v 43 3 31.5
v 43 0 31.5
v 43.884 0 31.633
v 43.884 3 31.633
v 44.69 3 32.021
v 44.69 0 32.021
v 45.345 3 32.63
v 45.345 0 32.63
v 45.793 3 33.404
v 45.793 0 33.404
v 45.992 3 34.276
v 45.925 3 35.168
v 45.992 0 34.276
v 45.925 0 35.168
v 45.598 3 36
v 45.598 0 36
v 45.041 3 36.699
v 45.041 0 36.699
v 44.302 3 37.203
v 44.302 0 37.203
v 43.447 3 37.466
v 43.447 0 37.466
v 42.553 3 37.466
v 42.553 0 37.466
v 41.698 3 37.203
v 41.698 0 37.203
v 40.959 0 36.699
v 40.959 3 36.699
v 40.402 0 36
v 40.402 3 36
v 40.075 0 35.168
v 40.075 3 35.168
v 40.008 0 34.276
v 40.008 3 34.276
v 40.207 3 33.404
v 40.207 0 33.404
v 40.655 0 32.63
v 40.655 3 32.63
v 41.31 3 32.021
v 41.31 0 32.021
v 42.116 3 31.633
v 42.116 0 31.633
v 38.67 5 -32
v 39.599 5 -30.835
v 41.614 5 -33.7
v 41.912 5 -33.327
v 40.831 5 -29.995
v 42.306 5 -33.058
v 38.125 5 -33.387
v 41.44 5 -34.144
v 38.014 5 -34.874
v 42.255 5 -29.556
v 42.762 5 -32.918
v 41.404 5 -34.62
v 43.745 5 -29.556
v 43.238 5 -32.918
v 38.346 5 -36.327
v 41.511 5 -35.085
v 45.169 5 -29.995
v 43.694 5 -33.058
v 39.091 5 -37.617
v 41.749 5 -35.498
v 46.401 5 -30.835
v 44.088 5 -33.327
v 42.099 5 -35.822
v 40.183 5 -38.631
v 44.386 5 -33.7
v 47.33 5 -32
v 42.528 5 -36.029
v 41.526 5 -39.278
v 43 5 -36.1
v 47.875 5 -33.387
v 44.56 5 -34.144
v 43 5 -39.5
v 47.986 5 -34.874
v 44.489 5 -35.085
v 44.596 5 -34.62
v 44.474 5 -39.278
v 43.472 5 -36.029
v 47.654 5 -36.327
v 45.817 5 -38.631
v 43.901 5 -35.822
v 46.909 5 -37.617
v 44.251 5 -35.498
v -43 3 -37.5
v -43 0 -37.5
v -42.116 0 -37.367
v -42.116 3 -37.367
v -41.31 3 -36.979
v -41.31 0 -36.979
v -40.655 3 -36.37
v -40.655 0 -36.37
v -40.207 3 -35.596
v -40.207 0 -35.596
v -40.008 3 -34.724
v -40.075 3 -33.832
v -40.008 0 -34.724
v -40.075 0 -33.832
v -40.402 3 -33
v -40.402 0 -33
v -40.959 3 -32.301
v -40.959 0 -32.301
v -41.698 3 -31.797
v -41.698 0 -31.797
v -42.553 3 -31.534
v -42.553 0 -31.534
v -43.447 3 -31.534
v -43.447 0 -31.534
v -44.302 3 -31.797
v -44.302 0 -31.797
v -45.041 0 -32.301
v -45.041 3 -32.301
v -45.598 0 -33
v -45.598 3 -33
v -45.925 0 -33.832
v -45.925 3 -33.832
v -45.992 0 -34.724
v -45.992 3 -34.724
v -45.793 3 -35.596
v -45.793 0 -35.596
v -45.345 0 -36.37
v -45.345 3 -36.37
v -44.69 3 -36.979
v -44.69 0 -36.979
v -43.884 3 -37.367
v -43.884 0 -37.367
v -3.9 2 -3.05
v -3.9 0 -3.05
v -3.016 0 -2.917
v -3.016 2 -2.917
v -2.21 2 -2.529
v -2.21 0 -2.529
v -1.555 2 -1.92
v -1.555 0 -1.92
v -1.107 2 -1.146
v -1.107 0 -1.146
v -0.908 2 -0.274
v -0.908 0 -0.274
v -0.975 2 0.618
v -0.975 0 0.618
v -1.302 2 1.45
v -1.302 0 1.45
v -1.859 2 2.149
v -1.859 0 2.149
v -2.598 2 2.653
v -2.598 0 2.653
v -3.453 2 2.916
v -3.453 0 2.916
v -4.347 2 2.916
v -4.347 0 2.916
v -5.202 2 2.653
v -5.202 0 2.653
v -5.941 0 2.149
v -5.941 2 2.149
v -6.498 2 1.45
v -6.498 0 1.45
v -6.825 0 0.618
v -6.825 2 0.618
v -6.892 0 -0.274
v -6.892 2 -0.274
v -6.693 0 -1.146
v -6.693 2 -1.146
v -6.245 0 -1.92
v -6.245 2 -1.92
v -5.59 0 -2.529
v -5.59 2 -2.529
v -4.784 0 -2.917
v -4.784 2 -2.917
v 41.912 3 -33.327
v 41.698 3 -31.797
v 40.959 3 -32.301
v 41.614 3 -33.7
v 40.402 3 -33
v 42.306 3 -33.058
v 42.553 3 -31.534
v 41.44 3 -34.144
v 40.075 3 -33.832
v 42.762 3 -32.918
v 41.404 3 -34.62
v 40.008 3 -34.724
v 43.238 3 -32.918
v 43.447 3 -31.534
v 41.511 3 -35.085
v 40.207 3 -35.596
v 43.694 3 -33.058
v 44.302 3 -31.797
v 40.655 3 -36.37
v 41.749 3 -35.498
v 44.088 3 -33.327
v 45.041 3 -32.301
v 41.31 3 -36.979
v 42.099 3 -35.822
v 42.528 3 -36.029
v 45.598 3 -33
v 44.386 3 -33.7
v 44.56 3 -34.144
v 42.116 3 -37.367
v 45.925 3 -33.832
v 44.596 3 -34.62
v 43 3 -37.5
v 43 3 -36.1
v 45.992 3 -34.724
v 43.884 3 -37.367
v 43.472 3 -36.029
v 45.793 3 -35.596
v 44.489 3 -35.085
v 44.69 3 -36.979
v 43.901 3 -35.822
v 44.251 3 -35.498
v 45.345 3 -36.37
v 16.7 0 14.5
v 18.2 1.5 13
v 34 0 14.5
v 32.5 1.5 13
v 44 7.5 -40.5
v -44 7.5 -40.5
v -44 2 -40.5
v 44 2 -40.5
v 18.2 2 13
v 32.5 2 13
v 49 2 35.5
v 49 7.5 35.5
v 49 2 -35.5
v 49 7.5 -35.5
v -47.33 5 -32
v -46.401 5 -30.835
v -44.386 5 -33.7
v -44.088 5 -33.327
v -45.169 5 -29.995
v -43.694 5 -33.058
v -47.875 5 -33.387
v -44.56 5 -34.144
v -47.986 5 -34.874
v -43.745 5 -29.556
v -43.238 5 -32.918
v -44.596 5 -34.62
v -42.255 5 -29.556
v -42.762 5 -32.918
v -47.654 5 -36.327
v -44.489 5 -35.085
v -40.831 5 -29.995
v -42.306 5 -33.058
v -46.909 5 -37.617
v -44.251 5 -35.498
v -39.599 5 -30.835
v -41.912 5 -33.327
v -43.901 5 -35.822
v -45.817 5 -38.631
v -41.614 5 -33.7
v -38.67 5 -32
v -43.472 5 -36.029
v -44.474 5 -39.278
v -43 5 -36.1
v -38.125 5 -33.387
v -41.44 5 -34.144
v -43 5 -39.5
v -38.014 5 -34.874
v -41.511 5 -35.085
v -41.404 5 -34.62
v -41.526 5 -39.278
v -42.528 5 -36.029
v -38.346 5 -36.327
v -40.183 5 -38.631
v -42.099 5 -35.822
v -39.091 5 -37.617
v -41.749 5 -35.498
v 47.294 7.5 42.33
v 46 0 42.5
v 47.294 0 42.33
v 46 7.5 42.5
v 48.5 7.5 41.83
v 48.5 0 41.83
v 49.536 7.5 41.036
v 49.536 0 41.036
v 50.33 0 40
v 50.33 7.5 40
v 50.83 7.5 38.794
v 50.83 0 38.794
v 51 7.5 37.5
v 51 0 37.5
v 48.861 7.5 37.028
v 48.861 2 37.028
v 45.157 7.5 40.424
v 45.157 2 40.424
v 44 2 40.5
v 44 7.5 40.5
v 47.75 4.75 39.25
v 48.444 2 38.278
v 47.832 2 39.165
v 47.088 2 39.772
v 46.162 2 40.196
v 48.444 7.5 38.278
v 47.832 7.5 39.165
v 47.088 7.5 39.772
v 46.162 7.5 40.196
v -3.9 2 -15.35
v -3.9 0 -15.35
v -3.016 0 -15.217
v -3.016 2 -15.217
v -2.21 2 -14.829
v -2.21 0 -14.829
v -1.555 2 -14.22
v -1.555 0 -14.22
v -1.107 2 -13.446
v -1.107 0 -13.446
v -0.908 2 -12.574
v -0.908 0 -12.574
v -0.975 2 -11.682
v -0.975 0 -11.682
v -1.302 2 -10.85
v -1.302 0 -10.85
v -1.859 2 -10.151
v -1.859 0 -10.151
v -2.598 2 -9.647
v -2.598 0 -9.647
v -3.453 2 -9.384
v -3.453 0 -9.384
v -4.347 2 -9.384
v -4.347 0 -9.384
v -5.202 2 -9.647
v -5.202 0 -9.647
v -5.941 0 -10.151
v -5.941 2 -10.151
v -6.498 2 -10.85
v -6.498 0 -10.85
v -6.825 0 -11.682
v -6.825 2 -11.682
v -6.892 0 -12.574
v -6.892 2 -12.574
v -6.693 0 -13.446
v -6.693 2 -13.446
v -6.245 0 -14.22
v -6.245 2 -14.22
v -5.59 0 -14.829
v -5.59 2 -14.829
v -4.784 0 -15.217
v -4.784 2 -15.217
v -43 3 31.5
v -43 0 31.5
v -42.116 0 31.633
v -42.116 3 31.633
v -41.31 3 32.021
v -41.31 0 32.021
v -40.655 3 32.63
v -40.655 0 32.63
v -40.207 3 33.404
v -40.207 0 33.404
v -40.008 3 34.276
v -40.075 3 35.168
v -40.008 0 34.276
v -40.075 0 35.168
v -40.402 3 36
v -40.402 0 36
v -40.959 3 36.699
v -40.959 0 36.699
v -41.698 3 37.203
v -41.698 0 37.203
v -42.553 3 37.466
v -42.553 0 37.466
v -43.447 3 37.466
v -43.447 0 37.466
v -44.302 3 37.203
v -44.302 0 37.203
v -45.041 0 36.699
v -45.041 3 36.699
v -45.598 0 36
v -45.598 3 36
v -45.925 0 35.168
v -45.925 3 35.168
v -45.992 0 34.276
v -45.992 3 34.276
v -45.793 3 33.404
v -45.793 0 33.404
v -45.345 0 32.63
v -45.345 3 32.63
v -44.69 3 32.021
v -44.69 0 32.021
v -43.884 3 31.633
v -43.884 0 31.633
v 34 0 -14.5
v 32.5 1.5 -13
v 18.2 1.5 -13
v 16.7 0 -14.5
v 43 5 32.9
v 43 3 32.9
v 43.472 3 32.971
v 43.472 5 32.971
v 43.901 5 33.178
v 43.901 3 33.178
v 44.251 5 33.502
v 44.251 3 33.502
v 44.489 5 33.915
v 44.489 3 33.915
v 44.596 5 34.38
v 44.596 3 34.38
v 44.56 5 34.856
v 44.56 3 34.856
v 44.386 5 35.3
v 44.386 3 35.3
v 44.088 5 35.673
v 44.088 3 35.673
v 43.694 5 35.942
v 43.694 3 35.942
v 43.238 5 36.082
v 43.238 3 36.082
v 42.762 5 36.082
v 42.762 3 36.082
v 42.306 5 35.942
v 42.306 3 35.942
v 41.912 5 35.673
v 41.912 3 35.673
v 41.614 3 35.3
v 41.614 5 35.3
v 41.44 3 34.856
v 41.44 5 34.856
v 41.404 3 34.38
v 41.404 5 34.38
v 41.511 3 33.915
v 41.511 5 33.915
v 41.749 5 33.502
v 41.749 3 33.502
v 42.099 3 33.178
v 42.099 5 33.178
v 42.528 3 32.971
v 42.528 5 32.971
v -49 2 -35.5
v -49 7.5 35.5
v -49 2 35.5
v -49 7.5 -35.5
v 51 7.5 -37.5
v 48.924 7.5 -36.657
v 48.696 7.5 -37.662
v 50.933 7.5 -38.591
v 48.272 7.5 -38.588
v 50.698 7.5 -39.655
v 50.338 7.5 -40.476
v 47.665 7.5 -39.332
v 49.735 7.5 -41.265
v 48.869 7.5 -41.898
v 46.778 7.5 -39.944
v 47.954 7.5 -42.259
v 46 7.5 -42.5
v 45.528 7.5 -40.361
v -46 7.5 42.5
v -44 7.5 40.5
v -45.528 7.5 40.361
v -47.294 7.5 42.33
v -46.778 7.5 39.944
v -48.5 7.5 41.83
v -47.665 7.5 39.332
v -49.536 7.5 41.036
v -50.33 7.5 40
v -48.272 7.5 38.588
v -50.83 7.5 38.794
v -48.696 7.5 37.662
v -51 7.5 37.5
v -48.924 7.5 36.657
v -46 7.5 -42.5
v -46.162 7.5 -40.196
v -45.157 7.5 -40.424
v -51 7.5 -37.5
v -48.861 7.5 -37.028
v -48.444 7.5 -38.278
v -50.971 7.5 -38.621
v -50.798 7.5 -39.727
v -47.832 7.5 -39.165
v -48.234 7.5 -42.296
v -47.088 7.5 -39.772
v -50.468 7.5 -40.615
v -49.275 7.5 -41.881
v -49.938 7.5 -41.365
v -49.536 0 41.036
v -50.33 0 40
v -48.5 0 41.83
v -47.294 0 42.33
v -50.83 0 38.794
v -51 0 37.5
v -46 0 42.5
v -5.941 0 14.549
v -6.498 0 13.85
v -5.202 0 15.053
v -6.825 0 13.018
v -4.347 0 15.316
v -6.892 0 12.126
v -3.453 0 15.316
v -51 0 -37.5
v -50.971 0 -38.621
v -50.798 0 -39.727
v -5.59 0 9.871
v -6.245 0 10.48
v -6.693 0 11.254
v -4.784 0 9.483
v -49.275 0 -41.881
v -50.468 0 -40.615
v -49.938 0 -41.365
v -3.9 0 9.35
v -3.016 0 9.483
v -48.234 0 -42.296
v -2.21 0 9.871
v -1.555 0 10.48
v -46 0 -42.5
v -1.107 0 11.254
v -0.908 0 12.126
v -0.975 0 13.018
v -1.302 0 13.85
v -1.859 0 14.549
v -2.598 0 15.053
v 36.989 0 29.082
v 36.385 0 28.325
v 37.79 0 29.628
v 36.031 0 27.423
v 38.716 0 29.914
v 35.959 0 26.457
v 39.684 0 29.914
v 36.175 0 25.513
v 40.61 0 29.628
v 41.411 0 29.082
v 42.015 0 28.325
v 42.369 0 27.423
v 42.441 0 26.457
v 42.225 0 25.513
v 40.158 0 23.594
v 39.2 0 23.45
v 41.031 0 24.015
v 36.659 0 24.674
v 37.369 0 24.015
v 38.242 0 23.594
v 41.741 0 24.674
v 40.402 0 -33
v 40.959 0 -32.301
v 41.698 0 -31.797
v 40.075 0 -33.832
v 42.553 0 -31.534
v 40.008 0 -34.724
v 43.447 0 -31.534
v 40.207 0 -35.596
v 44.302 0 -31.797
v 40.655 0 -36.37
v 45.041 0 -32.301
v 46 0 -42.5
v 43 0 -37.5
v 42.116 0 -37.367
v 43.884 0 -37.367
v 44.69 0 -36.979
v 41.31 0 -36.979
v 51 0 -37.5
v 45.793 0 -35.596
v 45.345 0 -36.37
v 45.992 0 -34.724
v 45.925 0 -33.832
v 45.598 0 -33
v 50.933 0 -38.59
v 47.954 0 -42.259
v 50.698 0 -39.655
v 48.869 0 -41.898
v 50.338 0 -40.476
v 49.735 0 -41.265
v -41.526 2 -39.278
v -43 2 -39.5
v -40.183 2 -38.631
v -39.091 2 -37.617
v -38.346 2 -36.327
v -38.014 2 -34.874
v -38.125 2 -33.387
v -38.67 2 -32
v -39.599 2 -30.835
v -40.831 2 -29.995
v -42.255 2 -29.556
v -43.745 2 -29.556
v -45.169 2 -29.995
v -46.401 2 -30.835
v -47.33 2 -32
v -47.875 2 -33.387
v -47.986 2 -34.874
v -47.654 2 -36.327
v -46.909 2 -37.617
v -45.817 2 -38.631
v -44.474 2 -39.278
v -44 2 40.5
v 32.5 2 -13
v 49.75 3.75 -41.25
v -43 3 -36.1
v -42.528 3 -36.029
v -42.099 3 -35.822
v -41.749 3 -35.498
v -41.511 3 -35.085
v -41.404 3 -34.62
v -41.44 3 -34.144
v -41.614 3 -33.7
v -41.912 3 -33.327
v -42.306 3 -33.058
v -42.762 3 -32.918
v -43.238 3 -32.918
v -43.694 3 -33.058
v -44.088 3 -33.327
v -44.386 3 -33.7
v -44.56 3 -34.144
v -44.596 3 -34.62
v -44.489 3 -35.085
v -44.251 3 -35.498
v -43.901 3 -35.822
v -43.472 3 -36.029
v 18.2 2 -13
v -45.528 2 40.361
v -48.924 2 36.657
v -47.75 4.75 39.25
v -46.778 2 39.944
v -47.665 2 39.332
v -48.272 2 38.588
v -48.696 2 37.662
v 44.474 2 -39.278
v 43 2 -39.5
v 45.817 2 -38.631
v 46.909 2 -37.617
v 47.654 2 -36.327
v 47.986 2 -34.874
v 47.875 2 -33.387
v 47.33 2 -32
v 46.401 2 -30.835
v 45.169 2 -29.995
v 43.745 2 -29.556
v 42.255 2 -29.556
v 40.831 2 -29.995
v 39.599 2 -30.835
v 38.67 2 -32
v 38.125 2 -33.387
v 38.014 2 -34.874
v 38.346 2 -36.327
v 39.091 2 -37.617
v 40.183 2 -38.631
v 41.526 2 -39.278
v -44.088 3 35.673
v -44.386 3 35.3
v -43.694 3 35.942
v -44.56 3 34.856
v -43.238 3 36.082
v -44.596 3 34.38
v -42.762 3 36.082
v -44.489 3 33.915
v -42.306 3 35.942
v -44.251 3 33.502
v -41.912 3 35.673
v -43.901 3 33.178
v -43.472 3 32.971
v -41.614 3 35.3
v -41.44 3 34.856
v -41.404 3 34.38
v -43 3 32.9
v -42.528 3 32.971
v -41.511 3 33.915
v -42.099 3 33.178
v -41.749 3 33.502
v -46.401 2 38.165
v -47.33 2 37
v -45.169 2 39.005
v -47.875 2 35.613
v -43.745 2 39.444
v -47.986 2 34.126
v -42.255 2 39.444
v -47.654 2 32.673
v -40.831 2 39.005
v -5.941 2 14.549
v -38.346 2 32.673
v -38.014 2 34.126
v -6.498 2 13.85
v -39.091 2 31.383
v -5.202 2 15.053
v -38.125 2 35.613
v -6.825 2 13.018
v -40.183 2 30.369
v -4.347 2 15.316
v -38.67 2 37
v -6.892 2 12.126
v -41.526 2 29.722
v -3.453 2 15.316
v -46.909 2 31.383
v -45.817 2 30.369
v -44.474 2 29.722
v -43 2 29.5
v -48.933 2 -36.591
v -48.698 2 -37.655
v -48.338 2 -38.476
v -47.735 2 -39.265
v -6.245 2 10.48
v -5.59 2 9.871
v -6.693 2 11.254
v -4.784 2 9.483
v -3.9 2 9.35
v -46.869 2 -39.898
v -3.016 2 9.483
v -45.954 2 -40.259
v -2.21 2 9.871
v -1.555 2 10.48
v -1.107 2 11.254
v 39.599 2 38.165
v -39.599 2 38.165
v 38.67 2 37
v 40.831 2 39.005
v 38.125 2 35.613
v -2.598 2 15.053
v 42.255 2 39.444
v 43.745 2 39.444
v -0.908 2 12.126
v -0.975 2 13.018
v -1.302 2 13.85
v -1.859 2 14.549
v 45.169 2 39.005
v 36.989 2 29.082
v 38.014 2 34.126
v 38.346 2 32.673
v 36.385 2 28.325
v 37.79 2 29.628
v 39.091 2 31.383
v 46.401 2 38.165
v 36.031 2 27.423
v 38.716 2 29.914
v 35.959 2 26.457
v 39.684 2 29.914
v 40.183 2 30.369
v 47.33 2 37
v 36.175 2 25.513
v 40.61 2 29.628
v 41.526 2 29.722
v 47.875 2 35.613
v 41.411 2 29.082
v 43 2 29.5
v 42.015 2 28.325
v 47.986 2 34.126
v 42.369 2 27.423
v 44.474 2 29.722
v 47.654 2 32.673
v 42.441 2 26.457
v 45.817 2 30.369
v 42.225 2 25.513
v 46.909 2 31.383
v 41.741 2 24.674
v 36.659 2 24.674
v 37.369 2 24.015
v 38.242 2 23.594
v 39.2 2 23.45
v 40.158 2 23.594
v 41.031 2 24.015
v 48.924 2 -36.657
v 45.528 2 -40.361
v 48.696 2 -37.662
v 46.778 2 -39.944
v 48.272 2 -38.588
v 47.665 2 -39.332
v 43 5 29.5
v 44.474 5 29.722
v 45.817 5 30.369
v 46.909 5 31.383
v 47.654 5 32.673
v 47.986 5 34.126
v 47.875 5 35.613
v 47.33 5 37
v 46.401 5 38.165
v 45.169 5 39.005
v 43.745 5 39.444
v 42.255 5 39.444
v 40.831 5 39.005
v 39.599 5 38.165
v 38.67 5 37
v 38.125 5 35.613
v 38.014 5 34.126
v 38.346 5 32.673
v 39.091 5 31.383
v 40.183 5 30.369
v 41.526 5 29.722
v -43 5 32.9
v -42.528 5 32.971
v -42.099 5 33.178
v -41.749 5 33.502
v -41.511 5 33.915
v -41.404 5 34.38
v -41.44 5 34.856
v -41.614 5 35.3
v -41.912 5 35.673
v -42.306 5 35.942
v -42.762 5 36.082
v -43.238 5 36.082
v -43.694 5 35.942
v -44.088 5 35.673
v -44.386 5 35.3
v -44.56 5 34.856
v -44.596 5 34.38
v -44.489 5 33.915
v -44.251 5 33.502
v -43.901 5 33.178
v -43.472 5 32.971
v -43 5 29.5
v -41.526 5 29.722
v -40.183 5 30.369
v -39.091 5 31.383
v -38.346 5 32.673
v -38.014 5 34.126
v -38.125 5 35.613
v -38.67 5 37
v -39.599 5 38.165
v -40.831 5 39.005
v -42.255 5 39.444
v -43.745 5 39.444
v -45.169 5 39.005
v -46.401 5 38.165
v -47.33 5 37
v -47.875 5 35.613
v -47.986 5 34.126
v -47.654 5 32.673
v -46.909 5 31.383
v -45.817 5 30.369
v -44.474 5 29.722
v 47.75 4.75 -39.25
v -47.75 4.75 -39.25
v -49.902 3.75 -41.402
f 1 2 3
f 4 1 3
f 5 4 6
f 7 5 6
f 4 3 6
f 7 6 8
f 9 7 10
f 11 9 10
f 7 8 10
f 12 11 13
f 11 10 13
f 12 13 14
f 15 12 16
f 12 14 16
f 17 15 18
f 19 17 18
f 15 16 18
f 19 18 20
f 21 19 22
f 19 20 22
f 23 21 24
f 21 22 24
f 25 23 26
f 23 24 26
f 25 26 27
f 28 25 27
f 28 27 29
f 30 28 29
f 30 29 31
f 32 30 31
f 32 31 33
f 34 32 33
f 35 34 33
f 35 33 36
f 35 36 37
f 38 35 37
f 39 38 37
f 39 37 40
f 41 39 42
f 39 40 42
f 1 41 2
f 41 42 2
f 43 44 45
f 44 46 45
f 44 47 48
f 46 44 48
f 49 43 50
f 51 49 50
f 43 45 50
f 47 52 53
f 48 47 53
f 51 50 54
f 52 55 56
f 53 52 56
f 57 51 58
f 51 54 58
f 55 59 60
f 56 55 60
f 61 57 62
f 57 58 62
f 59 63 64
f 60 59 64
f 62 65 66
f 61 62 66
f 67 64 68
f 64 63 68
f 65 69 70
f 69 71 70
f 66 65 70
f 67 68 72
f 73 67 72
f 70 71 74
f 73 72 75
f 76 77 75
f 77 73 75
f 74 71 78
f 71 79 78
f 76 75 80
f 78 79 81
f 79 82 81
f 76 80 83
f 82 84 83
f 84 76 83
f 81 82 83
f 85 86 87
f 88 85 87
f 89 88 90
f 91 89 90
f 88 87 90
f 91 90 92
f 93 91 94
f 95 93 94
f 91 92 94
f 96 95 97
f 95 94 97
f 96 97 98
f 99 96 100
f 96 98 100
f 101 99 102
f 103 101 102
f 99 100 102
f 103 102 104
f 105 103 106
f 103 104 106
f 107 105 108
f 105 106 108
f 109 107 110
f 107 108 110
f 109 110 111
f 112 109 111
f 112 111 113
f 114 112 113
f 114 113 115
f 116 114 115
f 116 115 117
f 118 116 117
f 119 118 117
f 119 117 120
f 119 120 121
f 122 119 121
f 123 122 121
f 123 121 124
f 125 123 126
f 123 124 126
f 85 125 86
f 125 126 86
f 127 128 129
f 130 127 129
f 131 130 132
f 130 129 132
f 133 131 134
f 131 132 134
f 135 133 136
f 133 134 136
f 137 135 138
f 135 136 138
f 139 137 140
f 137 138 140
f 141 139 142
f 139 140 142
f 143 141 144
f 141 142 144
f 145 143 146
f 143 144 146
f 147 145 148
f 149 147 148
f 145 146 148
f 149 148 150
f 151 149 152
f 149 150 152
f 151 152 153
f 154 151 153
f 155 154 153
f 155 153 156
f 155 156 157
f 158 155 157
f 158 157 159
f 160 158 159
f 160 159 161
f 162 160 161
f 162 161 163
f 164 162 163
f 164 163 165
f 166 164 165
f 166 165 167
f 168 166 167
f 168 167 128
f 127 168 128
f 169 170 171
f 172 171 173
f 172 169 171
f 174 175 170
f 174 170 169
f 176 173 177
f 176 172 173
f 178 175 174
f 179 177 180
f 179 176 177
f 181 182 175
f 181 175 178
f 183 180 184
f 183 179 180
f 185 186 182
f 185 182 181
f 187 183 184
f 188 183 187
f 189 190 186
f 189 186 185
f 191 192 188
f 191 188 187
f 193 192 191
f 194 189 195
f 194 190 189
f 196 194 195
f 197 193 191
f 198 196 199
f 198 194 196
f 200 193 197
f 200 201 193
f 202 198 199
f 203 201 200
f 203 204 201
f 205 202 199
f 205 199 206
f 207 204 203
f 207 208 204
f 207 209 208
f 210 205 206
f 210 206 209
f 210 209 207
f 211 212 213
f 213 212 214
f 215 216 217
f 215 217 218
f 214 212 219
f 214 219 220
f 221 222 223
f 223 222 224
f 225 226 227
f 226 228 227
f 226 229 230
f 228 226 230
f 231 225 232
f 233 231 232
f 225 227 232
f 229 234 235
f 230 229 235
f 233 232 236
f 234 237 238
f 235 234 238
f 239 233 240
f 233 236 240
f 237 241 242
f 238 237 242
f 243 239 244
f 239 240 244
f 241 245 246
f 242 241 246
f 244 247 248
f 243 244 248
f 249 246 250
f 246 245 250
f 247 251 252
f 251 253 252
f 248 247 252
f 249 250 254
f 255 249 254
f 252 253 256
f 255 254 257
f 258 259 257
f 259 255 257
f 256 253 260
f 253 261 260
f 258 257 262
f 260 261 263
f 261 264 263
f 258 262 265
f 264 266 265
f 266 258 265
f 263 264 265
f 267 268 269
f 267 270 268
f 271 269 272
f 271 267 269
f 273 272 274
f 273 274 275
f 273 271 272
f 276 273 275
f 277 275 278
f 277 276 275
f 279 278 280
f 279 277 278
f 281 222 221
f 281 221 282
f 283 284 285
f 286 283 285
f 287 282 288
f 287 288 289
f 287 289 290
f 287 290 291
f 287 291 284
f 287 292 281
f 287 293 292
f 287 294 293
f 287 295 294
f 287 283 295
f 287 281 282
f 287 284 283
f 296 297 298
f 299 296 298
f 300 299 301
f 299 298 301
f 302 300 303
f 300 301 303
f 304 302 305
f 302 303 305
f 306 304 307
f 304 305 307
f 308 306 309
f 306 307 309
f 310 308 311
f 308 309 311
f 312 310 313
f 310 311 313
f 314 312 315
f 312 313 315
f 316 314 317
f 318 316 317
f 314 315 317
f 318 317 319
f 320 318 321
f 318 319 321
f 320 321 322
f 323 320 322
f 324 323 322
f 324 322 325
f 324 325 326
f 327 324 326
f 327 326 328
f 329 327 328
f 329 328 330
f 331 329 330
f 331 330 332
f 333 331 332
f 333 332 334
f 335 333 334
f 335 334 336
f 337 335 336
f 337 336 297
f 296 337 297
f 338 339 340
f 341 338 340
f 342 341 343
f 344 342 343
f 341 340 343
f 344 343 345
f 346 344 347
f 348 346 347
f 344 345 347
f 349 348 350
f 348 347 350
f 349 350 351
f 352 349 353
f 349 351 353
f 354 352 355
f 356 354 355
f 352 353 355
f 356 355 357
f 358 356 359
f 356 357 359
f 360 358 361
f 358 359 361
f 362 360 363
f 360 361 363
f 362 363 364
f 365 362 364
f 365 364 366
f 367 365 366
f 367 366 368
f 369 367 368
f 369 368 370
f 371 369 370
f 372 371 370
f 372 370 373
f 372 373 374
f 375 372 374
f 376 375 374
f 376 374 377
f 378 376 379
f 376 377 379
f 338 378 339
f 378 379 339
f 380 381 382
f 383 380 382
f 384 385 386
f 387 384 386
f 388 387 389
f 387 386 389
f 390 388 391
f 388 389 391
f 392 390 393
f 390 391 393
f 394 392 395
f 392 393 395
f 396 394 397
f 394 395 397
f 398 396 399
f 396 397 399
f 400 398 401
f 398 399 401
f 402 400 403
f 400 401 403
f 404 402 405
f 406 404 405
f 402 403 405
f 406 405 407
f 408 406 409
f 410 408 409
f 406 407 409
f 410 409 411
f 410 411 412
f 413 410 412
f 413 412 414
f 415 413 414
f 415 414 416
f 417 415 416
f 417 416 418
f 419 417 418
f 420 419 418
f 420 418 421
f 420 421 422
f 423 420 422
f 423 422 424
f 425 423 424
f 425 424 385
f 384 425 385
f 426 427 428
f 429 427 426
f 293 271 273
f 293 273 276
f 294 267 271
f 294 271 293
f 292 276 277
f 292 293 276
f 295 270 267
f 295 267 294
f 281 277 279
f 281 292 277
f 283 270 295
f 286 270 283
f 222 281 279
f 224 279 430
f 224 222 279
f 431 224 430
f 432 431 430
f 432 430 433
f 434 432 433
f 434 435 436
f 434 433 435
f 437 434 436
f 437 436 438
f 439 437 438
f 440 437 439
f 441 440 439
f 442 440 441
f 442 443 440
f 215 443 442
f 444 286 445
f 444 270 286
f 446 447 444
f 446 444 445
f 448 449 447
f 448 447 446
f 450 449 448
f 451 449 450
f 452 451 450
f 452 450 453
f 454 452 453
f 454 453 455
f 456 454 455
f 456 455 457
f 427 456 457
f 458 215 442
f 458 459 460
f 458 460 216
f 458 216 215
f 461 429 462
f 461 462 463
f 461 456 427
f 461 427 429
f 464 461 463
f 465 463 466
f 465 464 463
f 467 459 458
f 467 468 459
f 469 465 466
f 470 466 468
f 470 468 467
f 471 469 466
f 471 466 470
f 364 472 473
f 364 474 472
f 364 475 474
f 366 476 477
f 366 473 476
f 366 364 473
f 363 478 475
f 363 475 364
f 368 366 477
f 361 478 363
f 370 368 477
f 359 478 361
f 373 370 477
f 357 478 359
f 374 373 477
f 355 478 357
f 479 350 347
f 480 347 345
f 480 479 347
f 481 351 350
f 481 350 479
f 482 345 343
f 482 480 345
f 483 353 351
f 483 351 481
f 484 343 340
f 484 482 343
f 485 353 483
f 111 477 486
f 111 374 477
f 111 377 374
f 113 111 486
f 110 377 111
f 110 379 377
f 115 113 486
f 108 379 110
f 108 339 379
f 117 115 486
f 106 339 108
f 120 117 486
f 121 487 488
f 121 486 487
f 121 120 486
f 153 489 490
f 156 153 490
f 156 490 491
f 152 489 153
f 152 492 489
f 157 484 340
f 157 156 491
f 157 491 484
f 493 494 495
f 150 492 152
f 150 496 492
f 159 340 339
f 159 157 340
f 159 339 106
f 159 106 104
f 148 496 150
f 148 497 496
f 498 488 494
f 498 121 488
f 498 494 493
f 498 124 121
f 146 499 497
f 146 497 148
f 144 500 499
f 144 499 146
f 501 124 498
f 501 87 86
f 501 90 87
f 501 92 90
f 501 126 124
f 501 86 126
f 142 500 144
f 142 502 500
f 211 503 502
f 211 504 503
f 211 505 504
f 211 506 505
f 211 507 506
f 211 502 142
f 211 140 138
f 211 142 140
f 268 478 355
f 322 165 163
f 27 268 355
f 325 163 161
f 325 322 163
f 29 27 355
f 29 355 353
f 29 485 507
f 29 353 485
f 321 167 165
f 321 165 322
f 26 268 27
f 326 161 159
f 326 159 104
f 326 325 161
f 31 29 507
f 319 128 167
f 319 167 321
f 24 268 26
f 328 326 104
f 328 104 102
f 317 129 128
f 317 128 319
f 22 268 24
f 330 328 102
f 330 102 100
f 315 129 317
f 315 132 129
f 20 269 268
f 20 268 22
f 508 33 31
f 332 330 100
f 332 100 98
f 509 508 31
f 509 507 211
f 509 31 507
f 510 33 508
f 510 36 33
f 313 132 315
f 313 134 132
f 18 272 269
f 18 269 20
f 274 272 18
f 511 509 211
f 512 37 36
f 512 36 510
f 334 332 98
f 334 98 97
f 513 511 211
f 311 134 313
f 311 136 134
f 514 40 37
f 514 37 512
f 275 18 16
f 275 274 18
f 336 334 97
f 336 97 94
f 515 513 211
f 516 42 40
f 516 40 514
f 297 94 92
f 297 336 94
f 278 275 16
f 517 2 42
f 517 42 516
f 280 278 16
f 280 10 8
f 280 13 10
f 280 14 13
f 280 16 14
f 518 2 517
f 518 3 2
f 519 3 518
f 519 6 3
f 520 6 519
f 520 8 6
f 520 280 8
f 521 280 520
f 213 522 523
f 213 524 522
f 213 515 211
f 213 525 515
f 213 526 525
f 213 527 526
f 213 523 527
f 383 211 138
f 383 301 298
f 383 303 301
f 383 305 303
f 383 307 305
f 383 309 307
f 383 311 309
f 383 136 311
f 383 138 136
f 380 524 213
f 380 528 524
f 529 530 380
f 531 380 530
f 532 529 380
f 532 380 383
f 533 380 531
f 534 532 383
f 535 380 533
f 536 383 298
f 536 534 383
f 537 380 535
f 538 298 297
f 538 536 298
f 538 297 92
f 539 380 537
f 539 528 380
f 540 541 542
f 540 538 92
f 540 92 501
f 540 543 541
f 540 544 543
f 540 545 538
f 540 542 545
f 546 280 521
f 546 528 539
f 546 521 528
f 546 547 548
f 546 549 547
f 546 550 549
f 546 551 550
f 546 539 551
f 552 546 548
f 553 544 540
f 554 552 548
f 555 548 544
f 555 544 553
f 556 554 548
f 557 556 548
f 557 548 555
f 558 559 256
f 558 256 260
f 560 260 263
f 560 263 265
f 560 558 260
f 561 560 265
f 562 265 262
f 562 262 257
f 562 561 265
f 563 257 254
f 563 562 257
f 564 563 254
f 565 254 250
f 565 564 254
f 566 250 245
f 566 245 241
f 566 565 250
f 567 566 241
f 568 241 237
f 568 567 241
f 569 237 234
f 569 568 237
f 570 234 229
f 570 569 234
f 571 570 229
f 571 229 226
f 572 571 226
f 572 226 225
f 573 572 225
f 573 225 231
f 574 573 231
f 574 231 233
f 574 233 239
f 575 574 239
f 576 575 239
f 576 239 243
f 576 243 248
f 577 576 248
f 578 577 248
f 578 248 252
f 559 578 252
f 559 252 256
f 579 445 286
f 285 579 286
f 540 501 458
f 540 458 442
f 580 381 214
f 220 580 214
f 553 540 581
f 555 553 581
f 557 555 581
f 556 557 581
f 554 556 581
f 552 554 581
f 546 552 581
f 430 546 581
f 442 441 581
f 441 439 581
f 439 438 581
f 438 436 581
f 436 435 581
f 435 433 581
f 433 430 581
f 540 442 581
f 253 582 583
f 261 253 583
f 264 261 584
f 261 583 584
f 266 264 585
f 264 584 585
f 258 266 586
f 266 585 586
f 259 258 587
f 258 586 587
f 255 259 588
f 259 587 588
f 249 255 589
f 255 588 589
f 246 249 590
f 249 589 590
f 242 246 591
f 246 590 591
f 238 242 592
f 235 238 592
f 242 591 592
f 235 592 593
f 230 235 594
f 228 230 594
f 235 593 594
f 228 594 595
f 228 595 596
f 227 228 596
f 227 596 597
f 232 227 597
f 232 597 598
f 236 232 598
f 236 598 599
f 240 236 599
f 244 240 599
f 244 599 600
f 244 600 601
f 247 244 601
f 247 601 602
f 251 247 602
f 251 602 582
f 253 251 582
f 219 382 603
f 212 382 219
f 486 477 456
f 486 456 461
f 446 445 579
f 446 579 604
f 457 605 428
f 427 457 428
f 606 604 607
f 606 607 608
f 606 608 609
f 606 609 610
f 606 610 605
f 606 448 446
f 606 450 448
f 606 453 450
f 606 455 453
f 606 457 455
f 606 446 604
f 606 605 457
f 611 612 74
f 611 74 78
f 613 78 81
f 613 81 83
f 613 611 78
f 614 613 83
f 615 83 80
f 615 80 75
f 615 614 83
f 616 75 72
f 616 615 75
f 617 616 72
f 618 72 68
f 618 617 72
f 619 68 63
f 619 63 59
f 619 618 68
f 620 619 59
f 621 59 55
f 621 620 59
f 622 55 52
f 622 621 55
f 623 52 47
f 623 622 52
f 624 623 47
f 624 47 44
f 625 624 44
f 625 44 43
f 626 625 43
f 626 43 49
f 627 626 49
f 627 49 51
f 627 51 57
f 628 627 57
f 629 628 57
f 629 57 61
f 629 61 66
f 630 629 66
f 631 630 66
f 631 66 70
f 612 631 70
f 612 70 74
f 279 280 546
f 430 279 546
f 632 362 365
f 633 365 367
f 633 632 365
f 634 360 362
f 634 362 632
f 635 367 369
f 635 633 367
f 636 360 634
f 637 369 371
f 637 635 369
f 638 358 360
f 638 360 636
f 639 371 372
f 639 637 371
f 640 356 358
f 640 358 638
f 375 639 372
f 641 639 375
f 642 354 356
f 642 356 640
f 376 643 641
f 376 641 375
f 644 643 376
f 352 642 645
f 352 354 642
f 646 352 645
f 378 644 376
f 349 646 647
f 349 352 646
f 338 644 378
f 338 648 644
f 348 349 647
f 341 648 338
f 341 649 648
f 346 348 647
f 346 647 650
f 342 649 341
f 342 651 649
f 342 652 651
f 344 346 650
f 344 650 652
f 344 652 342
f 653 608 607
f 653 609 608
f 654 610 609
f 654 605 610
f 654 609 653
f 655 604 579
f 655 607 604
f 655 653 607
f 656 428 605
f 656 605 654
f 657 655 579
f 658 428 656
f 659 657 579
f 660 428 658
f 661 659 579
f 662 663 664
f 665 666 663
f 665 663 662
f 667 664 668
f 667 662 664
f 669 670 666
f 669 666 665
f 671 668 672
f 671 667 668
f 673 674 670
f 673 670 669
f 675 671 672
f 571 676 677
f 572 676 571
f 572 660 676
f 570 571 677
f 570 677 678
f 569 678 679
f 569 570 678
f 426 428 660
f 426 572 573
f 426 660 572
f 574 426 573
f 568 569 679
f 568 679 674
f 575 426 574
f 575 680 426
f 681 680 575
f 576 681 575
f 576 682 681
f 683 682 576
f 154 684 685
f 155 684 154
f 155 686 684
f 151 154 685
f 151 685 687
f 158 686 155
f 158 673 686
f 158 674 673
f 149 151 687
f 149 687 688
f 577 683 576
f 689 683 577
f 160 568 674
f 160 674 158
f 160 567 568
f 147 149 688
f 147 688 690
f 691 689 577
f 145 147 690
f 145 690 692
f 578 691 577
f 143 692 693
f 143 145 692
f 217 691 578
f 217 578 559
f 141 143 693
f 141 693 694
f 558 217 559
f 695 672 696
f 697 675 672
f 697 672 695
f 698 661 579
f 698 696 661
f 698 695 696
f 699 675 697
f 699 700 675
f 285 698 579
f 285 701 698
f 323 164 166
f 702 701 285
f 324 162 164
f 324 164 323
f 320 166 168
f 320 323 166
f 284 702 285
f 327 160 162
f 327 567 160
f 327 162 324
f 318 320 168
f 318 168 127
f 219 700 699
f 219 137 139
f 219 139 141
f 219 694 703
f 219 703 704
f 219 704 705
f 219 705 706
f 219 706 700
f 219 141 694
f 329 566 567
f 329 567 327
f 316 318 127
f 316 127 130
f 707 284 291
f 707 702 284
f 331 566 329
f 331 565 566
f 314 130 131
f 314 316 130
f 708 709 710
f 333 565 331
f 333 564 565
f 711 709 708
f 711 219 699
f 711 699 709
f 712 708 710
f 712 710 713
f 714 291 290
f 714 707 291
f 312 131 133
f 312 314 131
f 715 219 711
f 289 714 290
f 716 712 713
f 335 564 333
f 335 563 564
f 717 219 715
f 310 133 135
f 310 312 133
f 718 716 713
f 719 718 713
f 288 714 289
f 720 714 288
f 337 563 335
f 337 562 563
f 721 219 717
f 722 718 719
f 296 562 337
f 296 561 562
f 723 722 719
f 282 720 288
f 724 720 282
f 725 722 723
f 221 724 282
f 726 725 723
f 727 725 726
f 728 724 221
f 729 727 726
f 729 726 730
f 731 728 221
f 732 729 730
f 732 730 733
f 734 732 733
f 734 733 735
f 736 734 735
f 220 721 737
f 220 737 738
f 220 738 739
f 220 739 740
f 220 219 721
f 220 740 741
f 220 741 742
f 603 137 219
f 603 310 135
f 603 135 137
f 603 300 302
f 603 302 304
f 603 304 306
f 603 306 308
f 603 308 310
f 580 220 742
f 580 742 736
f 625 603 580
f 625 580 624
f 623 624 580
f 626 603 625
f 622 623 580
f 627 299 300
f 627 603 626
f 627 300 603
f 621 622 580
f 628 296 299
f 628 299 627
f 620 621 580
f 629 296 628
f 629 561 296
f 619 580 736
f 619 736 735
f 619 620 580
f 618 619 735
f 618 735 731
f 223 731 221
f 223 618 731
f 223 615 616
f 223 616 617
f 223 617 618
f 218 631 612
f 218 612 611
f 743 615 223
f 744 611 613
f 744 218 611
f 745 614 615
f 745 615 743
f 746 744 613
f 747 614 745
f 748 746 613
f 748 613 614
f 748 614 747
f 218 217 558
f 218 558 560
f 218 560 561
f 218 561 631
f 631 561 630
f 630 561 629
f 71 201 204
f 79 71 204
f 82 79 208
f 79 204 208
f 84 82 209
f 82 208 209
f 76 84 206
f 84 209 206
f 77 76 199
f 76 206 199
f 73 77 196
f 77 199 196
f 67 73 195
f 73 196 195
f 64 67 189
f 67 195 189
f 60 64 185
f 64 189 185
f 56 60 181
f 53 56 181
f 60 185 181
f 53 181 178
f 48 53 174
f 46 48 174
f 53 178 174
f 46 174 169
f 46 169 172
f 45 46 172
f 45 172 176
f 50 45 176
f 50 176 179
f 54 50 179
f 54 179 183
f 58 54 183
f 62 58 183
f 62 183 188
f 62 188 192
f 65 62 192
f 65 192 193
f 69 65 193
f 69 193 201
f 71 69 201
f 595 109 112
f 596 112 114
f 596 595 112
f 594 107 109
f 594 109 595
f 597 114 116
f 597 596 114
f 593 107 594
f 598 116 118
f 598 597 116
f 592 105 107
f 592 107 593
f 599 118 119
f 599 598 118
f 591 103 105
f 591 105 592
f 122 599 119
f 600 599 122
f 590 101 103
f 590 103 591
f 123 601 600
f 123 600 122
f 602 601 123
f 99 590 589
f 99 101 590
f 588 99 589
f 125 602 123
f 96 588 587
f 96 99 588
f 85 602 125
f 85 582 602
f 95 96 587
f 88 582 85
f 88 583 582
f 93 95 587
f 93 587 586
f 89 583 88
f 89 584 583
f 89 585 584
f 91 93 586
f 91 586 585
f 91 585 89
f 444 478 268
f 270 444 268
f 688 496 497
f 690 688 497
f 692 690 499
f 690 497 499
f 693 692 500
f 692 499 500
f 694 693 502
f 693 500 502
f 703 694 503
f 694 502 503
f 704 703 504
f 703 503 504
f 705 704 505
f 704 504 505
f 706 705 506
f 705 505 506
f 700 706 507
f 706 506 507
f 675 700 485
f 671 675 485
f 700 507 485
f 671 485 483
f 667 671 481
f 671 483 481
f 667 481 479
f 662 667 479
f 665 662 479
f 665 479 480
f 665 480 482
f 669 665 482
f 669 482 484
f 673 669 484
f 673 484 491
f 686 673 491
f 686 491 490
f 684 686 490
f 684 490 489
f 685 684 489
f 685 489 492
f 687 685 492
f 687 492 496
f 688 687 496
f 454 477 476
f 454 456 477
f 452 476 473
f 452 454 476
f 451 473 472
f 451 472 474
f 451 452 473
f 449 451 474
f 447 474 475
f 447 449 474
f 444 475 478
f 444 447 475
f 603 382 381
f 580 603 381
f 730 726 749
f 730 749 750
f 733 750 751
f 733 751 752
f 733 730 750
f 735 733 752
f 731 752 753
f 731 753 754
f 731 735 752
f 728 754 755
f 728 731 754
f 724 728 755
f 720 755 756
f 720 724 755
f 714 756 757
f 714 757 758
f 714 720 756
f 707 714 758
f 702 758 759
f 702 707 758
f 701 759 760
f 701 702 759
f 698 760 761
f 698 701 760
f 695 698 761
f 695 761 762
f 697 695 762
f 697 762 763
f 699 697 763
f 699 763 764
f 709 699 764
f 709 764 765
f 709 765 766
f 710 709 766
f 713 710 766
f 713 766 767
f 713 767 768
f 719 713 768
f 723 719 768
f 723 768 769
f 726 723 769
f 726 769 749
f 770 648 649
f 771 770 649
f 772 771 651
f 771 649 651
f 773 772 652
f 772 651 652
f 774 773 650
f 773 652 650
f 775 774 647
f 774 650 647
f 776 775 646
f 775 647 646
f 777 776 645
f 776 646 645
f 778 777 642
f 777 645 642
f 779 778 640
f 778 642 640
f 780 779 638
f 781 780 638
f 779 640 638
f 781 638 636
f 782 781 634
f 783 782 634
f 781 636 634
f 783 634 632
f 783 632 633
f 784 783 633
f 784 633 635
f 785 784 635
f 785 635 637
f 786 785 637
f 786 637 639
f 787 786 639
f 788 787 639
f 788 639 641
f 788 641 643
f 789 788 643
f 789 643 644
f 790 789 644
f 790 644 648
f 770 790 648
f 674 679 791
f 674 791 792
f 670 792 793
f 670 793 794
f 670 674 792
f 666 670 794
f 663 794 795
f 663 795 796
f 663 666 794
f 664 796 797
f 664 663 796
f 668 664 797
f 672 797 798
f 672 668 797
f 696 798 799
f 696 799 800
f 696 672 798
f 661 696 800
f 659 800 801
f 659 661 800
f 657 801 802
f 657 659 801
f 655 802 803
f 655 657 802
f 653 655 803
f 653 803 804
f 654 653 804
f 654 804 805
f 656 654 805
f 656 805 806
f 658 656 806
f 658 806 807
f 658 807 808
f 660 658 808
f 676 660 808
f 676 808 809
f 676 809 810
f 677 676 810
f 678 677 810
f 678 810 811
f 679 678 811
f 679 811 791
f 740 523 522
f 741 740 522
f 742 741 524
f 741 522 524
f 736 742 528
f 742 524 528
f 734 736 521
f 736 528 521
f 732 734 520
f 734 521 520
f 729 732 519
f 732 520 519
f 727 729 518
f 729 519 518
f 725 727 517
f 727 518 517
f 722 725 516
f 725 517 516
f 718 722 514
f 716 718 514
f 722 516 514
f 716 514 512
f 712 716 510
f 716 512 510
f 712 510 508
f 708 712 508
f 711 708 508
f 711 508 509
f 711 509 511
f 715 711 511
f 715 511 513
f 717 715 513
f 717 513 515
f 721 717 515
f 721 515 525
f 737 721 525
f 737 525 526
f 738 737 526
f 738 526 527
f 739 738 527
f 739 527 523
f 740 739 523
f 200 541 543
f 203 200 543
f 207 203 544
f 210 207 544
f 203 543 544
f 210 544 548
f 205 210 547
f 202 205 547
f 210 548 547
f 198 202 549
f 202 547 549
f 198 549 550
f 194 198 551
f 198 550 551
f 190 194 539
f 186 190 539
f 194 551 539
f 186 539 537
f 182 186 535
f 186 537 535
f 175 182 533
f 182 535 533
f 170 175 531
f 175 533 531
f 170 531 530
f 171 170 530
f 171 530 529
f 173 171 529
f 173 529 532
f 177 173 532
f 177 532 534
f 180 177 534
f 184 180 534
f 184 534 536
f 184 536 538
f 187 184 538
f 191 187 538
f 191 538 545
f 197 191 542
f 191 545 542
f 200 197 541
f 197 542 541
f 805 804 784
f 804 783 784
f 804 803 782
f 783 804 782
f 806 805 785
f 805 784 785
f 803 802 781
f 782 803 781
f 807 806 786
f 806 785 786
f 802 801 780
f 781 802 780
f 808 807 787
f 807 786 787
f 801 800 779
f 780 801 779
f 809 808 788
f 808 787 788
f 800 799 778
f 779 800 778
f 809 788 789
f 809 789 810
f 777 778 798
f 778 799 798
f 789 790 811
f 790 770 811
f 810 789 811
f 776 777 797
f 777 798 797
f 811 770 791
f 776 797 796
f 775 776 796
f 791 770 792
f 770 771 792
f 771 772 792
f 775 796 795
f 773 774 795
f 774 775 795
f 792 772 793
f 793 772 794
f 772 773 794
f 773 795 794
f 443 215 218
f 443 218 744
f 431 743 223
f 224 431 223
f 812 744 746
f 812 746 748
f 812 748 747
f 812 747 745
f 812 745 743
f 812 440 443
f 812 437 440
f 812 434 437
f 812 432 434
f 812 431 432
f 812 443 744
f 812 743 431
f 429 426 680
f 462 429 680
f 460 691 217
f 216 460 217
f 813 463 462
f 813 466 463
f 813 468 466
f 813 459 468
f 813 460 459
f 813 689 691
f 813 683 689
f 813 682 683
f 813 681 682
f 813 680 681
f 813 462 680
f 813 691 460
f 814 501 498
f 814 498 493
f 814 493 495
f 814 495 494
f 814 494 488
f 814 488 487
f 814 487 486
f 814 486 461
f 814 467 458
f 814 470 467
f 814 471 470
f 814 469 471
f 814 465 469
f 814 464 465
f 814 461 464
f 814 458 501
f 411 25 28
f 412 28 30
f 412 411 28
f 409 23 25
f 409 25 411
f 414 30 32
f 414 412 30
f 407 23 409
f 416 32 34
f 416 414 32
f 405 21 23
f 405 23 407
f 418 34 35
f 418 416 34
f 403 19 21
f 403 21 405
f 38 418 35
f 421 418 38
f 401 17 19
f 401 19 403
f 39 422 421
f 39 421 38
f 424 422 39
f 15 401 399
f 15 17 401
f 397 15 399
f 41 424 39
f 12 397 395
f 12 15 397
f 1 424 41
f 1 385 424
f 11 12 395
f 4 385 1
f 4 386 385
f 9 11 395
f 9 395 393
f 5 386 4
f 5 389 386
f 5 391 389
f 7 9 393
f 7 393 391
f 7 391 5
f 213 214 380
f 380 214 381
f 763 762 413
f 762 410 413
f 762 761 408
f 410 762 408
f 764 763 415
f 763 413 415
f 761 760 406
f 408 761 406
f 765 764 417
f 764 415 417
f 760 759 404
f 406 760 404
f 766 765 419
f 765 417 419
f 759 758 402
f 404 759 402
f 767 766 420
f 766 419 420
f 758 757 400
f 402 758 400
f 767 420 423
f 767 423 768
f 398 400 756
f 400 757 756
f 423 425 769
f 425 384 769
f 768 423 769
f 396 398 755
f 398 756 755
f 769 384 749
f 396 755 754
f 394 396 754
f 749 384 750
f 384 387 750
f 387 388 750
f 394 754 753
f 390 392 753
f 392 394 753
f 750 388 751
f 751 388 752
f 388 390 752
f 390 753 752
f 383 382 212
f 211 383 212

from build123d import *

# Parameters (mm, degrees)
SKETCH1_W           = 102
SKETCH1_H           = 85
BOSS_EXTRUDE1_DEPTH = 7.5
SKETCH2_W           = 98
SKETCH2_H           = 81
CUT_EXTRUDE1_DEPTH  = 5.5
SKETCH3_R           = 5
BOSS_EXTRUDE2_DEPTH = 4
SKETCH3_3_R         = 5
BOSS_EXTRUDE3_DEPTH = 5
SKETCH4_R           = 3
CUT_EXTRUDE3_DEPTH  = 3
SKETCH5_R           = 1.6
CUT_EXTRUDE4_DEPTH  = 7.5
SKETCH6_W           = 14.3
SKETCH6_H           = 26
CUT_EXTRUDE5_DEPTH  = 10
CHAMFER1_SIZE       = 1.5
CHAMFER2_SIZE       = 1.5
CHAMFER3_SIZE       = 1.5
CHAMFER4_SIZE       = 1.5
SKETCH7_R           = 3.25
CUT_EXTRUDE6_DEPTH  = 10
FILLET2_R           = 5
FILLET3_SIZE        = 5
FILLET4_R           = 5
FILLET5_SIZE        = 5
FILLET6_SIZE        = 5
FILLET7_SIZE        = 5
FILLET8_SIZE        = 5
FILLET9_SIZE        = 5
SKETCH8_R           = 3
CUT_EXTRUDE7_DEPTH  = 3


with BuildPart() as part:
    # Sketch1 → Boss-Extrude1 (new body)
    with BuildSketch(Plane(origin=(0, 0, 0), x_dir=(1, 0, 0), z_dir=(0, 1, 0))):
        Rectangle(SKETCH1_W, SKETCH1_H)
    extrude(amount=BOSS_EXTRUDE1_DEPTH)

    # Sketch2 → Cut-Extrude1 (cut)
    with BuildSketch(Plane(origin=(0, 7.5, 0), x_dir=(1, 0, 0), z_dir=(0, 1, 0))):
        Rectangle(SKETCH2_W, SKETCH2_H)
    extrude(amount=-CUT_EXTRUDE1_DEPTH, mode=Mode.SUBTRACT)



with BuildPart() as body_2:
    # Sketch3 → Boss-Extrude2 (new body)
    with BuildSketch(Plane(origin=(0, 0, 0), x_dir=(-1, 0, 0), z_dir=(0, -1, 0))):
        with Locations(Location((43, -34.5, 0), (0, 0, 90))):
            Circle(SKETCH3_R)
    extrude(amount=-BOSS_EXTRUDE2_DEPTH)


with BuildPart() as part_1:
    add(part.part)

    add(body_2.part)  # Boss-Extrude3 merges body 2
    # Sketch3<3> → Boss-Extrude3 (add)
    with BuildSketch(Plane(origin=(0, 0, 0), x_dir=(-1, 0, 0), z_dir=(0, -1, 0))):
        with Locations(Location((43, -34.5, 0), (0, 0, 90))):
            Circle(SKETCH3_3_R)
        with Locations(Location((-43, -34.5, 0), (0, 0, 90))):
            Circle(SKETCH3_3_R)
        with Locations(Location((43, 34.5, 0), (0, 0, 90))):
            Circle(SKETCH3_3_R)
        with Locations(Location((-43, 34.5, 0), (0, 0, 90))):
            Circle(SKETCH3_3_R)
    extrude(amount=-BOSS_EXTRUDE3_DEPTH)

    # Sketch4 → Cut-Extrude3 (cut)
    with BuildSketch(Plane.XZ):
        with Locations(Location((-43, 34.5, 0), (0, 0, 270))):
            Circle(SKETCH4_R)
        with Locations(Location((43, 34.5, 0), (0, 0, 270))):
            Circle(SKETCH4_R)
        with Locations(Location((-43, -34.5, 0), (0, 0, 270))):
            Circle(SKETCH4_R)
        with Locations(Location((43, -34.5, 0), (0, 0, 270))):
            Circle(SKETCH4_R)
    extrude(amount=-CUT_EXTRUDE3_DEPTH, mode=Mode.SUBTRACT)

    # Sketch5 → Cut-Extrude4 (cut)
    with BuildSketch(Plane.XZ):
        with Locations(Location((-43, 34.5, 0), (0, 0, 270))):
            Circle(SKETCH5_R)
        with Locations(Location((43, 34.5, 0), (0, 0, 270))):
            Circle(SKETCH5_R)
        with Locations(Location((43, -34.5, 0), (0, 0, 270))):
            Circle(SKETCH5_R)
        with Locations(Location((-43, -34.5, 0), (0, 0, 270))):
            Circle(SKETCH5_R)
    extrude(amount=-CUT_EXTRUDE4_DEPTH, mode=Mode.SUBTRACT)

    # Sketch6 → Cut-Extrude5 (cut)
    with BuildSketch(Plane.XZ):
        with Locations((25.35, 0)):
            Rectangle(SKETCH6_W, SKETCH6_H)
    extrude(amount=-CUT_EXTRUDE5_DEPTH, mode=Mode.SUBTRACT)

    # Chamfer1
    chamfer1_edges = [part_1.edges().sort_by_distance(p)[0] for p in [
        (25.35, 0, 13),
    ]]
    chamfer(chamfer1_edges, length=CHAMFER1_SIZE)

    # Chamfer2
    chamfer2_edges = [part_1.edges().sort_by_distance(p)[0] for p in [
        (18.2, 0, 0.75),
    ]]
    chamfer(chamfer2_edges, length=CHAMFER2_SIZE)

    # Chamfer3
    chamfer3_edges = [part_1.edges().sort_by_distance(p)[0] for p in [
        (32.5, 0, 0.75),
    ]]
    chamfer(chamfer3_edges, length=CHAMFER3_SIZE)

    # Chamfer4
    chamfer4_edges = [part_1.edges().sort_by_distance(p)[0] for p in [
        (25.35, 0, -13),
    ]]
    chamfer(chamfer4_edges, length=CHAMFER4_SIZE)

    # Sketch7 → Cut-Extrude6 (cut)
    with BuildSketch(Plane(origin=(0, 0, 0), x_dir=(-1, 0, 0), z_dir=(0, -1, 0))):
        with Locations(Location((-39.2, -26.7, 0), (0, 0, 90))):
            Circle(SKETCH7_R)
    extrude(amount=-CUT_EXTRUDE6_DEPTH, mode=Mode.SUBTRACT)

    # Fillet2
    fillet2_edges = [part_1.edges().sort_by_distance(p)[0] for p in [
        (51, 3.75, 42.5),
    ]]
    fillet(fillet2_edges, radius=FILLET2_R)

    # Fillet3
    # a fillet whose section is not a circle: 5 mm, written as the material it takes off along each edge
    with BuildSketch(Plane(origin=(51, -12.5, -42.5), x_dir=(0, 0, 1), z_dir=(0, 1, 0))) as fillet3_piece_1:
        with BuildLine():
            Bezier((FILLET3_SIZE, 0), (0, 0), (0, -FILLET3_SIZE), weights=[1, 1, 1])
            Line((0, -FILLET3_SIZE), (0, 0))
            Line((0, 0), (FILLET3_SIZE, 0))
        make_face()
    extrude(amount=32.5, mode=Mode.SUBTRACT)

    # Fillet4
    fillet4_edges = [part_1.edges().sort_by_distance(p)[0] for p in [
        (-51, 3.75, 42.5),
    ]]
    fillet(fillet4_edges, radius=FILLET4_R)

    # Fillet5
    # a fillet whose section is not a circle: 5 mm, written as the material it takes off along each edge
    with BuildSketch(Plane(origin=(-51, -12.5, -42.5), x_dir=(0, 0, 1), z_dir=(0, 1, 0))) as fillet5_piece_1:
        with BuildLine():
            add(Edge.make_bspline([(FILLET5_SIZE, 0), (FILLET5_SIZE * 0.831801948466, 0), (FILLET5_SIZE * 0.663603896932, 0), (FILLET5_SIZE * 0.292893218813, FILLET5_SIZE * 0.0716919198361), (FILLET5_SIZE * 0.0716919198361, FILLET5_SIZE * 0.292893218813), (0, FILLET5_SIZE * 0.663603896932), (0, FILLET5_SIZE * 0.831801948466), (0, FILLET5_SIZE)], knots=[0, 0, 0, 0, 0, 0, 0.5, 0.5, 1, 1, 1, 1, 1, 1], degree=5))
            Line((0, FILLET5_SIZE), (0, 0))
            Line((0, 0), (FILLET5_SIZE, 0))
        make_face()
    extrude(amount=32.5, mode=Mode.SUBTRACT)

    # Fillet6
    # a fillet whose section is not a circle: 5 mm, written as the material it adds along each edge
    with BuildSketch(Plane(origin=(49, 7.5, -40.5), x_dir=(-1, 0, 0), z_dir=(0, -1, 0))) as fillet6_piece_1:
        with BuildLine():
            Bezier((FILLET6_SIZE, 0), (0, 0), (0, -FILLET6_SIZE), weights=[1, 1, 1])
            Line((0, -FILLET6_SIZE), (0, 0))
            Line((0, 0), (FILLET6_SIZE, 0))
        make_face()
    extrude(amount=5.5)

    # Fillet7
    # a fillet whose section is not a circle: 5 mm, written as the material it adds along each edge
    with BuildSketch(Plane(origin=(49, 7.5, 40.5), x_dir=(0, 0, -1), z_dir=(0, -1, 0))) as fillet7_piece_1:
        with BuildLine():
            Bezier((FILLET7_SIZE, 0), (0, 0), (0, -FILLET7_SIZE), weights=[1, 1, 1])
            Line((0, -FILLET7_SIZE), (0, 0))
            Line((0, 0), (FILLET7_SIZE, 0))
        make_face()
    extrude(amount=5.5)

    # Fillet8
    # a fillet whose section is not a circle: 5 mm, written as the material it adds along each edge
    with BuildSketch(Plane(origin=(-49, 7.5, 40.5), x_dir=(1, 0, 0), z_dir=(0, -1, 0))) as fillet8_piece_1:
        with BuildLine():
            Bezier((FILLET8_SIZE, 0), (0, 0), (0, -FILLET8_SIZE), weights=[1, 1, 1])
            Line((0, -FILLET8_SIZE), (0, 0))
            Line((0, 0), (FILLET8_SIZE, 0))
        make_face()
    extrude(amount=5.5)

    # Fillet9
    # a fillet whose section is not a circle: 5 mm, written as the material it adds along each edge
    with BuildSketch(Plane(origin=(-49, 7.5, -40.5), x_dir=(0, 0, 1), z_dir=(0, -1, 0))) as fillet9_piece_1_section:
        with BuildLine():
            Bezier((FILLET9_SIZE, 0), (0, 0), (0, -FILLET9_SIZE), weights=[1, 1, 1])
            Line((0, -FILLET9_SIZE), (0, 0))
            Line((0, 0), (FILLET9_SIZE, 0))
        make_face()
    fillet9_piece_1 = extrude(amount=18, mode=Mode.PRIVATE)
    fillet9_piece_1 = split(fillet9_piece_1, bisect_by=Plane(origin=(-49, 0, -40.5), z_dir=(0, 1, 0)), keep=Keep.TOP, mode=Mode.PRIVATE)
    add(fillet9_piece_1)

    # Sketch8 → Cut-Extrude7 (cut)
    with BuildSketch(Plane.XZ):
        with Locations(Location((-3.9, -12.35, 0), (0, 0, 270))):
            Circle(SKETCH8_R)
        with Locations(Location((-3.9, -0.05, 0), (0, 0, 270))):
            Circle(SKETCH8_R)
        with Locations(Location((-3.9, 12.35, 0), (0, 0, 270))):
            Circle(SKETCH8_R)
    extrude(amount=-CUT_EXTRUDE7_DEPTH, mode=Mode.SUBTRACT)


solid = part_1.part
